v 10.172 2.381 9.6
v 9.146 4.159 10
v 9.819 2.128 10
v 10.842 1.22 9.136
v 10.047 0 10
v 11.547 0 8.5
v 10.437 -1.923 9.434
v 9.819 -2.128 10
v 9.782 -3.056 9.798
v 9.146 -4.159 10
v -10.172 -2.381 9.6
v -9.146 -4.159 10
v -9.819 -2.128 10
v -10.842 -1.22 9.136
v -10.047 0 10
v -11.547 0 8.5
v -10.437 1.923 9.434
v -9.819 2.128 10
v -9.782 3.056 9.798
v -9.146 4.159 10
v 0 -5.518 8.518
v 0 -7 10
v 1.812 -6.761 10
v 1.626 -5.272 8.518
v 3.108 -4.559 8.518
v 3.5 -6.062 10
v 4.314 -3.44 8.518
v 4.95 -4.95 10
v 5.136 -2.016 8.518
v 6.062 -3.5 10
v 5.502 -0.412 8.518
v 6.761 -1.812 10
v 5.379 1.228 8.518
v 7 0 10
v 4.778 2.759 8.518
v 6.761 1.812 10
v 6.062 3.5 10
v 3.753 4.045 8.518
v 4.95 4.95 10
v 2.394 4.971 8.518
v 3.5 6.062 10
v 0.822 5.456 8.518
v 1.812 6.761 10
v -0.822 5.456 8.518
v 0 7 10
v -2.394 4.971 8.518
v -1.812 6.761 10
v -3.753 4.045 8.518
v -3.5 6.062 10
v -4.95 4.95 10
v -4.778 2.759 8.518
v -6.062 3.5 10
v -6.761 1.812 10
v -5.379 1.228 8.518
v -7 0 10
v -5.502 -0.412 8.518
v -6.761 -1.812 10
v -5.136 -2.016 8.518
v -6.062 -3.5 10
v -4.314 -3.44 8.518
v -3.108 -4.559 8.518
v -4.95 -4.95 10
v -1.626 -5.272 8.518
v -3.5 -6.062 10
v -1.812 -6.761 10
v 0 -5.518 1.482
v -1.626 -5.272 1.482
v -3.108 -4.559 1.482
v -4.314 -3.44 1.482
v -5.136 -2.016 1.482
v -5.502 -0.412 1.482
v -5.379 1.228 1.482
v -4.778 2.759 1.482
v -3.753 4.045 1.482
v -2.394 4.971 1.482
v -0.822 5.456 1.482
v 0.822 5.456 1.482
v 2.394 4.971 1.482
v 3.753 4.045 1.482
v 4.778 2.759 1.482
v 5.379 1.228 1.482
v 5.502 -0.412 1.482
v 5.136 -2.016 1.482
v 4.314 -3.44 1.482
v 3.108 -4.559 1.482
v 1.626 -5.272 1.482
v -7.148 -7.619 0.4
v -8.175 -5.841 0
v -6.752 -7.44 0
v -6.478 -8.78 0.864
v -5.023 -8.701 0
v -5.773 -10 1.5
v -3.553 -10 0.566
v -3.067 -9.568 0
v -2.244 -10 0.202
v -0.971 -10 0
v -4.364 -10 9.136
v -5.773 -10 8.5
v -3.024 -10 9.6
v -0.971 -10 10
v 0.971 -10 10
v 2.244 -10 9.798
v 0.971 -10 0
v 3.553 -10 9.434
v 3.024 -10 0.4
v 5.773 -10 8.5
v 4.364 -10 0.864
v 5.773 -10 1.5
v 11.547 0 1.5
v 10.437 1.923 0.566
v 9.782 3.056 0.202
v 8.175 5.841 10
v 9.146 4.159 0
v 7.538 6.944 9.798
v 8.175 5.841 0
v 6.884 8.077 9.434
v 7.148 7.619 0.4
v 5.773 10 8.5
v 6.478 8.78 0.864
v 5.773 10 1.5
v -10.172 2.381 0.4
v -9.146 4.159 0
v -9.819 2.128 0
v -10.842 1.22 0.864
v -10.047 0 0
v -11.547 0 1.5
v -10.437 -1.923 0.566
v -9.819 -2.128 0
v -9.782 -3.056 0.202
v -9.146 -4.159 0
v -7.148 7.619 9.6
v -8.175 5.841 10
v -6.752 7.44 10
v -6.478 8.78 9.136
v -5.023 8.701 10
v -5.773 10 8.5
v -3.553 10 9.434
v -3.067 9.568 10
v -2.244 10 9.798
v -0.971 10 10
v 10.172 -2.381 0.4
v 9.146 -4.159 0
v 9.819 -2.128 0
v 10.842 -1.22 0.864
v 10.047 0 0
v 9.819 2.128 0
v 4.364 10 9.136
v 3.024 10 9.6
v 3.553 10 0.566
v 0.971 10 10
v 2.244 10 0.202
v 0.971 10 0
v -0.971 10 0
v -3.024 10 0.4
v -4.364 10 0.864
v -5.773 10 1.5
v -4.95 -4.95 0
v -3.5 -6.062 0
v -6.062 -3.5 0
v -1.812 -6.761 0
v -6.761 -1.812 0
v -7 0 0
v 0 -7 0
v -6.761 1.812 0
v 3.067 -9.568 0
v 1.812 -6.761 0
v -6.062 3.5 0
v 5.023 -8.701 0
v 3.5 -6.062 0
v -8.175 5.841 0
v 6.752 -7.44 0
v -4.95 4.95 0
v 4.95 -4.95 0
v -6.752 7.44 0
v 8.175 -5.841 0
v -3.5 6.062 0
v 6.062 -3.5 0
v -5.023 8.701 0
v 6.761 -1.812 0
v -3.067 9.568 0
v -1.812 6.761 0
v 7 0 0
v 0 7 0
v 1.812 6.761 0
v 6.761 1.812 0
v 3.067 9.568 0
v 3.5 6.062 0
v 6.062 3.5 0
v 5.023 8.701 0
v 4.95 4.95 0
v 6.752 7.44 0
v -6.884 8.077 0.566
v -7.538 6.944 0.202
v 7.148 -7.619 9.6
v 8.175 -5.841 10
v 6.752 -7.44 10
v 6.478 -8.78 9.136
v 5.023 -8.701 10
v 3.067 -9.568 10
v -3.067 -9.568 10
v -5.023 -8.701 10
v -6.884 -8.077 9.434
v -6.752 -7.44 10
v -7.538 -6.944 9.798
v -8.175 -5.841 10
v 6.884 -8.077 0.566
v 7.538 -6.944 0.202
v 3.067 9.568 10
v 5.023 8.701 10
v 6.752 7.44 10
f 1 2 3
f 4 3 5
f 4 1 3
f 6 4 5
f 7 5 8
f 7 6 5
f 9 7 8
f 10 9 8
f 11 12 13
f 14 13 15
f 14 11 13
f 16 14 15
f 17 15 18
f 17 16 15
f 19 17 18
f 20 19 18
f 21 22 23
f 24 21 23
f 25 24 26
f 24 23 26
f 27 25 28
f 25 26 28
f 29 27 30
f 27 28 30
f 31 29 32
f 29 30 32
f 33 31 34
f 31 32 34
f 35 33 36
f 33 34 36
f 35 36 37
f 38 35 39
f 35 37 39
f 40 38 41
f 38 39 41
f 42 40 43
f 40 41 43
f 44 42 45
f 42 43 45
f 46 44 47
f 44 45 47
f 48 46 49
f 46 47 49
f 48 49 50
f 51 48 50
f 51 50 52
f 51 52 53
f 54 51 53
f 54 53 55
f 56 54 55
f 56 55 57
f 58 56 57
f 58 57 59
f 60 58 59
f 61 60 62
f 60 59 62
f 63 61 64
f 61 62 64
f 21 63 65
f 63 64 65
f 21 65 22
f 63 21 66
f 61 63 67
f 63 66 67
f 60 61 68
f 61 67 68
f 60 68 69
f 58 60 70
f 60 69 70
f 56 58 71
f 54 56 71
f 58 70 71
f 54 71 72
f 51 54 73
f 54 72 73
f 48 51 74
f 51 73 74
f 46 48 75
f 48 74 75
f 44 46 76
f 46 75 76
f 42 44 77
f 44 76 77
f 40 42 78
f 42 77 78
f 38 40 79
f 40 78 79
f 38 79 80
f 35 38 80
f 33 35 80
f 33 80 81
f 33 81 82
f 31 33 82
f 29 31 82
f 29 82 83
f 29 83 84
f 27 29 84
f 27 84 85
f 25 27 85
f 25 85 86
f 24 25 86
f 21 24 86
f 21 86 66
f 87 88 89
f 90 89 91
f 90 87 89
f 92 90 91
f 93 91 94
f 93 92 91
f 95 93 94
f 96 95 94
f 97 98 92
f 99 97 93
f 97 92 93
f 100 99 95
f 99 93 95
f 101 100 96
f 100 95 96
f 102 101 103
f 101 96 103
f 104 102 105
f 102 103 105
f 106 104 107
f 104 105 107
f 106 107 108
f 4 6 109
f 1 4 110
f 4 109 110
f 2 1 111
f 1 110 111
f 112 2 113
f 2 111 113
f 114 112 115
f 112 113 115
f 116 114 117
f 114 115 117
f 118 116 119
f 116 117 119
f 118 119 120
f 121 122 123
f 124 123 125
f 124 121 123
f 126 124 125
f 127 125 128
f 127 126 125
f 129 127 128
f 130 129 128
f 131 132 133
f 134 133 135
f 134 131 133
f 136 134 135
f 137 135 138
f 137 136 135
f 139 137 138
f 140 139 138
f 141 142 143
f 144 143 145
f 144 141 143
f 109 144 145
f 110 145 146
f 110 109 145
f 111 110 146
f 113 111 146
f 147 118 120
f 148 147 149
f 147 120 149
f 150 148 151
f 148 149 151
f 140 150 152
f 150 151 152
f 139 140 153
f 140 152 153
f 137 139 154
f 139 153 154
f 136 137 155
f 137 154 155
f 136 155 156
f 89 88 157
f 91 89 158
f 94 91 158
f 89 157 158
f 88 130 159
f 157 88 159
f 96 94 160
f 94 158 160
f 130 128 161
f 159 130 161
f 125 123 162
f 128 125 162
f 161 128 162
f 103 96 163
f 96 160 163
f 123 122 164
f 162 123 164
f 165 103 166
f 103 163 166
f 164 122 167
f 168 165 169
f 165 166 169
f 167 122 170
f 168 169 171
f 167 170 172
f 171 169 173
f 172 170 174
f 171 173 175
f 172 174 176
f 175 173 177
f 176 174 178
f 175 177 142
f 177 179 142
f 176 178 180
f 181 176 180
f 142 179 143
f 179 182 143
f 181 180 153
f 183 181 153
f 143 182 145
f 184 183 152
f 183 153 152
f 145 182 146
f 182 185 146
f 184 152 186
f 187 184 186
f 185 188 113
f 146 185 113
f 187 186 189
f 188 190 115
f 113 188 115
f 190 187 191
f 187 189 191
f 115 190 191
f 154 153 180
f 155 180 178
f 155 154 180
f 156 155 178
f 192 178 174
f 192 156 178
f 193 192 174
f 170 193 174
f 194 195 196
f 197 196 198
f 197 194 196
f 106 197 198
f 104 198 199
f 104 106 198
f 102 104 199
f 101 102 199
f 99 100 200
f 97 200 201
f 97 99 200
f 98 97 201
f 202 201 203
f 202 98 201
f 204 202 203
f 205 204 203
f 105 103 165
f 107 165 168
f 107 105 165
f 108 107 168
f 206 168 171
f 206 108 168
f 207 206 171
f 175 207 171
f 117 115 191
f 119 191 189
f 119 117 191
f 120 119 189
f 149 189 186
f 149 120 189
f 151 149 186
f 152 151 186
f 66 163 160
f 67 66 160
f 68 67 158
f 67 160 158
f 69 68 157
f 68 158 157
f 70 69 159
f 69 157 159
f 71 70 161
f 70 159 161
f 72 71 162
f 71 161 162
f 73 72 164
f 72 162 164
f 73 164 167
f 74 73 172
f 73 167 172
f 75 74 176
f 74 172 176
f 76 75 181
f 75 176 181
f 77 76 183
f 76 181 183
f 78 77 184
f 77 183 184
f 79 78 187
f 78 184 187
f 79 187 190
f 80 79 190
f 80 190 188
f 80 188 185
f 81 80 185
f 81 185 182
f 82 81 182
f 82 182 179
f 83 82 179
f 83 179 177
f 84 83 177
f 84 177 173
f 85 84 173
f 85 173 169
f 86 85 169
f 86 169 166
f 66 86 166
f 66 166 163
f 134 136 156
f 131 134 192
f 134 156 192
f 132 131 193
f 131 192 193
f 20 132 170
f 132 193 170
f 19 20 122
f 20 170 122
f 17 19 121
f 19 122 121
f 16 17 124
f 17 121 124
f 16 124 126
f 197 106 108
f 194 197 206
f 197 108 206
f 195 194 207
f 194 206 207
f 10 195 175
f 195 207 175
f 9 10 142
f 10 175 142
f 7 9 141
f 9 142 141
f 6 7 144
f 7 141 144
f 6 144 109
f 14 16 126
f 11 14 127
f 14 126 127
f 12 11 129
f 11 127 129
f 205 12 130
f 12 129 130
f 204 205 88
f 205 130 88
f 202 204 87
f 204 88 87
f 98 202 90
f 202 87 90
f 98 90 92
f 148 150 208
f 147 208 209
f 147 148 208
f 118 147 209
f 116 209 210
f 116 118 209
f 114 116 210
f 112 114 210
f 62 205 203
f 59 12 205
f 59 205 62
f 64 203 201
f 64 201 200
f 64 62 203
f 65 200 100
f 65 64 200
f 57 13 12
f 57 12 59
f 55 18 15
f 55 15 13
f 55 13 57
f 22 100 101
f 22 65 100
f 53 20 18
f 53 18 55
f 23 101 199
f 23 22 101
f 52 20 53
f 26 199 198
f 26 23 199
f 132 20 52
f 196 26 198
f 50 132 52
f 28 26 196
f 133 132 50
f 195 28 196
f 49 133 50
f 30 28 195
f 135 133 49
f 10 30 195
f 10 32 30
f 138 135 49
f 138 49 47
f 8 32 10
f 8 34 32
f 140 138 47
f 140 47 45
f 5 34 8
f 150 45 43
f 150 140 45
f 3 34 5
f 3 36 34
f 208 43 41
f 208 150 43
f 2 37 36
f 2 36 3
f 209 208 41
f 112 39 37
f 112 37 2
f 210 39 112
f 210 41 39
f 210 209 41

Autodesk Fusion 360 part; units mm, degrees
sketch "Hex Polygon" plane through (0, 0, 0) normal (0, 0, 1) x (1, 0, 0)
  line L0 (5.7735, 10) -> (-5.7735, 10)
  line L1 (-5.7735, 10) -> (-11.547, 0)
  line L2 (-11.547, 0) -> (-5.7735, -10)
  line L3 (-5.7735, -10) -> (5.7735, -10)
  line L4 (5.7735, -10) -> (11.547, 0)
  line L5 (11.547, 0) -> (5.7735, 10)
  dimension "d1" = 10
extrude "Extrude1" add sketch "Hex Polygon" along normal blind 10
sketch "Chamfer Sketch" plane through (0, 0, 0) normal (0, 1, 0) x (1, 0, 0)
  line L0 (11.547, -10) -> (10.047, -10)
  line L1 (10.047, -10) -> (11.547, -8.5)
  line L2 (11.547, -8.5) -> (11.547, -10)
  point P0 (11.547, -10)
  dimension "d4" = 1.5
revolve "Revolve1" cut sketch "Chamfer Sketch" angle 360 about axis through (0, 0, 1.75) along (0, 0, 1)
hole "Hole1" at (0, 0, 10) direction (0, 0, -1) diameter 11.035 end through all countersink diameter 14 countersink angle 90
ref_plane "WorkPlane1" through (0, 0, 5) normal (0, 0, 1) x (1, 0, 0)
mirror "Mirror1" about plane through (0, 0, 5) normal (0, 0, 1) of "Revolve1", "Hole1"
